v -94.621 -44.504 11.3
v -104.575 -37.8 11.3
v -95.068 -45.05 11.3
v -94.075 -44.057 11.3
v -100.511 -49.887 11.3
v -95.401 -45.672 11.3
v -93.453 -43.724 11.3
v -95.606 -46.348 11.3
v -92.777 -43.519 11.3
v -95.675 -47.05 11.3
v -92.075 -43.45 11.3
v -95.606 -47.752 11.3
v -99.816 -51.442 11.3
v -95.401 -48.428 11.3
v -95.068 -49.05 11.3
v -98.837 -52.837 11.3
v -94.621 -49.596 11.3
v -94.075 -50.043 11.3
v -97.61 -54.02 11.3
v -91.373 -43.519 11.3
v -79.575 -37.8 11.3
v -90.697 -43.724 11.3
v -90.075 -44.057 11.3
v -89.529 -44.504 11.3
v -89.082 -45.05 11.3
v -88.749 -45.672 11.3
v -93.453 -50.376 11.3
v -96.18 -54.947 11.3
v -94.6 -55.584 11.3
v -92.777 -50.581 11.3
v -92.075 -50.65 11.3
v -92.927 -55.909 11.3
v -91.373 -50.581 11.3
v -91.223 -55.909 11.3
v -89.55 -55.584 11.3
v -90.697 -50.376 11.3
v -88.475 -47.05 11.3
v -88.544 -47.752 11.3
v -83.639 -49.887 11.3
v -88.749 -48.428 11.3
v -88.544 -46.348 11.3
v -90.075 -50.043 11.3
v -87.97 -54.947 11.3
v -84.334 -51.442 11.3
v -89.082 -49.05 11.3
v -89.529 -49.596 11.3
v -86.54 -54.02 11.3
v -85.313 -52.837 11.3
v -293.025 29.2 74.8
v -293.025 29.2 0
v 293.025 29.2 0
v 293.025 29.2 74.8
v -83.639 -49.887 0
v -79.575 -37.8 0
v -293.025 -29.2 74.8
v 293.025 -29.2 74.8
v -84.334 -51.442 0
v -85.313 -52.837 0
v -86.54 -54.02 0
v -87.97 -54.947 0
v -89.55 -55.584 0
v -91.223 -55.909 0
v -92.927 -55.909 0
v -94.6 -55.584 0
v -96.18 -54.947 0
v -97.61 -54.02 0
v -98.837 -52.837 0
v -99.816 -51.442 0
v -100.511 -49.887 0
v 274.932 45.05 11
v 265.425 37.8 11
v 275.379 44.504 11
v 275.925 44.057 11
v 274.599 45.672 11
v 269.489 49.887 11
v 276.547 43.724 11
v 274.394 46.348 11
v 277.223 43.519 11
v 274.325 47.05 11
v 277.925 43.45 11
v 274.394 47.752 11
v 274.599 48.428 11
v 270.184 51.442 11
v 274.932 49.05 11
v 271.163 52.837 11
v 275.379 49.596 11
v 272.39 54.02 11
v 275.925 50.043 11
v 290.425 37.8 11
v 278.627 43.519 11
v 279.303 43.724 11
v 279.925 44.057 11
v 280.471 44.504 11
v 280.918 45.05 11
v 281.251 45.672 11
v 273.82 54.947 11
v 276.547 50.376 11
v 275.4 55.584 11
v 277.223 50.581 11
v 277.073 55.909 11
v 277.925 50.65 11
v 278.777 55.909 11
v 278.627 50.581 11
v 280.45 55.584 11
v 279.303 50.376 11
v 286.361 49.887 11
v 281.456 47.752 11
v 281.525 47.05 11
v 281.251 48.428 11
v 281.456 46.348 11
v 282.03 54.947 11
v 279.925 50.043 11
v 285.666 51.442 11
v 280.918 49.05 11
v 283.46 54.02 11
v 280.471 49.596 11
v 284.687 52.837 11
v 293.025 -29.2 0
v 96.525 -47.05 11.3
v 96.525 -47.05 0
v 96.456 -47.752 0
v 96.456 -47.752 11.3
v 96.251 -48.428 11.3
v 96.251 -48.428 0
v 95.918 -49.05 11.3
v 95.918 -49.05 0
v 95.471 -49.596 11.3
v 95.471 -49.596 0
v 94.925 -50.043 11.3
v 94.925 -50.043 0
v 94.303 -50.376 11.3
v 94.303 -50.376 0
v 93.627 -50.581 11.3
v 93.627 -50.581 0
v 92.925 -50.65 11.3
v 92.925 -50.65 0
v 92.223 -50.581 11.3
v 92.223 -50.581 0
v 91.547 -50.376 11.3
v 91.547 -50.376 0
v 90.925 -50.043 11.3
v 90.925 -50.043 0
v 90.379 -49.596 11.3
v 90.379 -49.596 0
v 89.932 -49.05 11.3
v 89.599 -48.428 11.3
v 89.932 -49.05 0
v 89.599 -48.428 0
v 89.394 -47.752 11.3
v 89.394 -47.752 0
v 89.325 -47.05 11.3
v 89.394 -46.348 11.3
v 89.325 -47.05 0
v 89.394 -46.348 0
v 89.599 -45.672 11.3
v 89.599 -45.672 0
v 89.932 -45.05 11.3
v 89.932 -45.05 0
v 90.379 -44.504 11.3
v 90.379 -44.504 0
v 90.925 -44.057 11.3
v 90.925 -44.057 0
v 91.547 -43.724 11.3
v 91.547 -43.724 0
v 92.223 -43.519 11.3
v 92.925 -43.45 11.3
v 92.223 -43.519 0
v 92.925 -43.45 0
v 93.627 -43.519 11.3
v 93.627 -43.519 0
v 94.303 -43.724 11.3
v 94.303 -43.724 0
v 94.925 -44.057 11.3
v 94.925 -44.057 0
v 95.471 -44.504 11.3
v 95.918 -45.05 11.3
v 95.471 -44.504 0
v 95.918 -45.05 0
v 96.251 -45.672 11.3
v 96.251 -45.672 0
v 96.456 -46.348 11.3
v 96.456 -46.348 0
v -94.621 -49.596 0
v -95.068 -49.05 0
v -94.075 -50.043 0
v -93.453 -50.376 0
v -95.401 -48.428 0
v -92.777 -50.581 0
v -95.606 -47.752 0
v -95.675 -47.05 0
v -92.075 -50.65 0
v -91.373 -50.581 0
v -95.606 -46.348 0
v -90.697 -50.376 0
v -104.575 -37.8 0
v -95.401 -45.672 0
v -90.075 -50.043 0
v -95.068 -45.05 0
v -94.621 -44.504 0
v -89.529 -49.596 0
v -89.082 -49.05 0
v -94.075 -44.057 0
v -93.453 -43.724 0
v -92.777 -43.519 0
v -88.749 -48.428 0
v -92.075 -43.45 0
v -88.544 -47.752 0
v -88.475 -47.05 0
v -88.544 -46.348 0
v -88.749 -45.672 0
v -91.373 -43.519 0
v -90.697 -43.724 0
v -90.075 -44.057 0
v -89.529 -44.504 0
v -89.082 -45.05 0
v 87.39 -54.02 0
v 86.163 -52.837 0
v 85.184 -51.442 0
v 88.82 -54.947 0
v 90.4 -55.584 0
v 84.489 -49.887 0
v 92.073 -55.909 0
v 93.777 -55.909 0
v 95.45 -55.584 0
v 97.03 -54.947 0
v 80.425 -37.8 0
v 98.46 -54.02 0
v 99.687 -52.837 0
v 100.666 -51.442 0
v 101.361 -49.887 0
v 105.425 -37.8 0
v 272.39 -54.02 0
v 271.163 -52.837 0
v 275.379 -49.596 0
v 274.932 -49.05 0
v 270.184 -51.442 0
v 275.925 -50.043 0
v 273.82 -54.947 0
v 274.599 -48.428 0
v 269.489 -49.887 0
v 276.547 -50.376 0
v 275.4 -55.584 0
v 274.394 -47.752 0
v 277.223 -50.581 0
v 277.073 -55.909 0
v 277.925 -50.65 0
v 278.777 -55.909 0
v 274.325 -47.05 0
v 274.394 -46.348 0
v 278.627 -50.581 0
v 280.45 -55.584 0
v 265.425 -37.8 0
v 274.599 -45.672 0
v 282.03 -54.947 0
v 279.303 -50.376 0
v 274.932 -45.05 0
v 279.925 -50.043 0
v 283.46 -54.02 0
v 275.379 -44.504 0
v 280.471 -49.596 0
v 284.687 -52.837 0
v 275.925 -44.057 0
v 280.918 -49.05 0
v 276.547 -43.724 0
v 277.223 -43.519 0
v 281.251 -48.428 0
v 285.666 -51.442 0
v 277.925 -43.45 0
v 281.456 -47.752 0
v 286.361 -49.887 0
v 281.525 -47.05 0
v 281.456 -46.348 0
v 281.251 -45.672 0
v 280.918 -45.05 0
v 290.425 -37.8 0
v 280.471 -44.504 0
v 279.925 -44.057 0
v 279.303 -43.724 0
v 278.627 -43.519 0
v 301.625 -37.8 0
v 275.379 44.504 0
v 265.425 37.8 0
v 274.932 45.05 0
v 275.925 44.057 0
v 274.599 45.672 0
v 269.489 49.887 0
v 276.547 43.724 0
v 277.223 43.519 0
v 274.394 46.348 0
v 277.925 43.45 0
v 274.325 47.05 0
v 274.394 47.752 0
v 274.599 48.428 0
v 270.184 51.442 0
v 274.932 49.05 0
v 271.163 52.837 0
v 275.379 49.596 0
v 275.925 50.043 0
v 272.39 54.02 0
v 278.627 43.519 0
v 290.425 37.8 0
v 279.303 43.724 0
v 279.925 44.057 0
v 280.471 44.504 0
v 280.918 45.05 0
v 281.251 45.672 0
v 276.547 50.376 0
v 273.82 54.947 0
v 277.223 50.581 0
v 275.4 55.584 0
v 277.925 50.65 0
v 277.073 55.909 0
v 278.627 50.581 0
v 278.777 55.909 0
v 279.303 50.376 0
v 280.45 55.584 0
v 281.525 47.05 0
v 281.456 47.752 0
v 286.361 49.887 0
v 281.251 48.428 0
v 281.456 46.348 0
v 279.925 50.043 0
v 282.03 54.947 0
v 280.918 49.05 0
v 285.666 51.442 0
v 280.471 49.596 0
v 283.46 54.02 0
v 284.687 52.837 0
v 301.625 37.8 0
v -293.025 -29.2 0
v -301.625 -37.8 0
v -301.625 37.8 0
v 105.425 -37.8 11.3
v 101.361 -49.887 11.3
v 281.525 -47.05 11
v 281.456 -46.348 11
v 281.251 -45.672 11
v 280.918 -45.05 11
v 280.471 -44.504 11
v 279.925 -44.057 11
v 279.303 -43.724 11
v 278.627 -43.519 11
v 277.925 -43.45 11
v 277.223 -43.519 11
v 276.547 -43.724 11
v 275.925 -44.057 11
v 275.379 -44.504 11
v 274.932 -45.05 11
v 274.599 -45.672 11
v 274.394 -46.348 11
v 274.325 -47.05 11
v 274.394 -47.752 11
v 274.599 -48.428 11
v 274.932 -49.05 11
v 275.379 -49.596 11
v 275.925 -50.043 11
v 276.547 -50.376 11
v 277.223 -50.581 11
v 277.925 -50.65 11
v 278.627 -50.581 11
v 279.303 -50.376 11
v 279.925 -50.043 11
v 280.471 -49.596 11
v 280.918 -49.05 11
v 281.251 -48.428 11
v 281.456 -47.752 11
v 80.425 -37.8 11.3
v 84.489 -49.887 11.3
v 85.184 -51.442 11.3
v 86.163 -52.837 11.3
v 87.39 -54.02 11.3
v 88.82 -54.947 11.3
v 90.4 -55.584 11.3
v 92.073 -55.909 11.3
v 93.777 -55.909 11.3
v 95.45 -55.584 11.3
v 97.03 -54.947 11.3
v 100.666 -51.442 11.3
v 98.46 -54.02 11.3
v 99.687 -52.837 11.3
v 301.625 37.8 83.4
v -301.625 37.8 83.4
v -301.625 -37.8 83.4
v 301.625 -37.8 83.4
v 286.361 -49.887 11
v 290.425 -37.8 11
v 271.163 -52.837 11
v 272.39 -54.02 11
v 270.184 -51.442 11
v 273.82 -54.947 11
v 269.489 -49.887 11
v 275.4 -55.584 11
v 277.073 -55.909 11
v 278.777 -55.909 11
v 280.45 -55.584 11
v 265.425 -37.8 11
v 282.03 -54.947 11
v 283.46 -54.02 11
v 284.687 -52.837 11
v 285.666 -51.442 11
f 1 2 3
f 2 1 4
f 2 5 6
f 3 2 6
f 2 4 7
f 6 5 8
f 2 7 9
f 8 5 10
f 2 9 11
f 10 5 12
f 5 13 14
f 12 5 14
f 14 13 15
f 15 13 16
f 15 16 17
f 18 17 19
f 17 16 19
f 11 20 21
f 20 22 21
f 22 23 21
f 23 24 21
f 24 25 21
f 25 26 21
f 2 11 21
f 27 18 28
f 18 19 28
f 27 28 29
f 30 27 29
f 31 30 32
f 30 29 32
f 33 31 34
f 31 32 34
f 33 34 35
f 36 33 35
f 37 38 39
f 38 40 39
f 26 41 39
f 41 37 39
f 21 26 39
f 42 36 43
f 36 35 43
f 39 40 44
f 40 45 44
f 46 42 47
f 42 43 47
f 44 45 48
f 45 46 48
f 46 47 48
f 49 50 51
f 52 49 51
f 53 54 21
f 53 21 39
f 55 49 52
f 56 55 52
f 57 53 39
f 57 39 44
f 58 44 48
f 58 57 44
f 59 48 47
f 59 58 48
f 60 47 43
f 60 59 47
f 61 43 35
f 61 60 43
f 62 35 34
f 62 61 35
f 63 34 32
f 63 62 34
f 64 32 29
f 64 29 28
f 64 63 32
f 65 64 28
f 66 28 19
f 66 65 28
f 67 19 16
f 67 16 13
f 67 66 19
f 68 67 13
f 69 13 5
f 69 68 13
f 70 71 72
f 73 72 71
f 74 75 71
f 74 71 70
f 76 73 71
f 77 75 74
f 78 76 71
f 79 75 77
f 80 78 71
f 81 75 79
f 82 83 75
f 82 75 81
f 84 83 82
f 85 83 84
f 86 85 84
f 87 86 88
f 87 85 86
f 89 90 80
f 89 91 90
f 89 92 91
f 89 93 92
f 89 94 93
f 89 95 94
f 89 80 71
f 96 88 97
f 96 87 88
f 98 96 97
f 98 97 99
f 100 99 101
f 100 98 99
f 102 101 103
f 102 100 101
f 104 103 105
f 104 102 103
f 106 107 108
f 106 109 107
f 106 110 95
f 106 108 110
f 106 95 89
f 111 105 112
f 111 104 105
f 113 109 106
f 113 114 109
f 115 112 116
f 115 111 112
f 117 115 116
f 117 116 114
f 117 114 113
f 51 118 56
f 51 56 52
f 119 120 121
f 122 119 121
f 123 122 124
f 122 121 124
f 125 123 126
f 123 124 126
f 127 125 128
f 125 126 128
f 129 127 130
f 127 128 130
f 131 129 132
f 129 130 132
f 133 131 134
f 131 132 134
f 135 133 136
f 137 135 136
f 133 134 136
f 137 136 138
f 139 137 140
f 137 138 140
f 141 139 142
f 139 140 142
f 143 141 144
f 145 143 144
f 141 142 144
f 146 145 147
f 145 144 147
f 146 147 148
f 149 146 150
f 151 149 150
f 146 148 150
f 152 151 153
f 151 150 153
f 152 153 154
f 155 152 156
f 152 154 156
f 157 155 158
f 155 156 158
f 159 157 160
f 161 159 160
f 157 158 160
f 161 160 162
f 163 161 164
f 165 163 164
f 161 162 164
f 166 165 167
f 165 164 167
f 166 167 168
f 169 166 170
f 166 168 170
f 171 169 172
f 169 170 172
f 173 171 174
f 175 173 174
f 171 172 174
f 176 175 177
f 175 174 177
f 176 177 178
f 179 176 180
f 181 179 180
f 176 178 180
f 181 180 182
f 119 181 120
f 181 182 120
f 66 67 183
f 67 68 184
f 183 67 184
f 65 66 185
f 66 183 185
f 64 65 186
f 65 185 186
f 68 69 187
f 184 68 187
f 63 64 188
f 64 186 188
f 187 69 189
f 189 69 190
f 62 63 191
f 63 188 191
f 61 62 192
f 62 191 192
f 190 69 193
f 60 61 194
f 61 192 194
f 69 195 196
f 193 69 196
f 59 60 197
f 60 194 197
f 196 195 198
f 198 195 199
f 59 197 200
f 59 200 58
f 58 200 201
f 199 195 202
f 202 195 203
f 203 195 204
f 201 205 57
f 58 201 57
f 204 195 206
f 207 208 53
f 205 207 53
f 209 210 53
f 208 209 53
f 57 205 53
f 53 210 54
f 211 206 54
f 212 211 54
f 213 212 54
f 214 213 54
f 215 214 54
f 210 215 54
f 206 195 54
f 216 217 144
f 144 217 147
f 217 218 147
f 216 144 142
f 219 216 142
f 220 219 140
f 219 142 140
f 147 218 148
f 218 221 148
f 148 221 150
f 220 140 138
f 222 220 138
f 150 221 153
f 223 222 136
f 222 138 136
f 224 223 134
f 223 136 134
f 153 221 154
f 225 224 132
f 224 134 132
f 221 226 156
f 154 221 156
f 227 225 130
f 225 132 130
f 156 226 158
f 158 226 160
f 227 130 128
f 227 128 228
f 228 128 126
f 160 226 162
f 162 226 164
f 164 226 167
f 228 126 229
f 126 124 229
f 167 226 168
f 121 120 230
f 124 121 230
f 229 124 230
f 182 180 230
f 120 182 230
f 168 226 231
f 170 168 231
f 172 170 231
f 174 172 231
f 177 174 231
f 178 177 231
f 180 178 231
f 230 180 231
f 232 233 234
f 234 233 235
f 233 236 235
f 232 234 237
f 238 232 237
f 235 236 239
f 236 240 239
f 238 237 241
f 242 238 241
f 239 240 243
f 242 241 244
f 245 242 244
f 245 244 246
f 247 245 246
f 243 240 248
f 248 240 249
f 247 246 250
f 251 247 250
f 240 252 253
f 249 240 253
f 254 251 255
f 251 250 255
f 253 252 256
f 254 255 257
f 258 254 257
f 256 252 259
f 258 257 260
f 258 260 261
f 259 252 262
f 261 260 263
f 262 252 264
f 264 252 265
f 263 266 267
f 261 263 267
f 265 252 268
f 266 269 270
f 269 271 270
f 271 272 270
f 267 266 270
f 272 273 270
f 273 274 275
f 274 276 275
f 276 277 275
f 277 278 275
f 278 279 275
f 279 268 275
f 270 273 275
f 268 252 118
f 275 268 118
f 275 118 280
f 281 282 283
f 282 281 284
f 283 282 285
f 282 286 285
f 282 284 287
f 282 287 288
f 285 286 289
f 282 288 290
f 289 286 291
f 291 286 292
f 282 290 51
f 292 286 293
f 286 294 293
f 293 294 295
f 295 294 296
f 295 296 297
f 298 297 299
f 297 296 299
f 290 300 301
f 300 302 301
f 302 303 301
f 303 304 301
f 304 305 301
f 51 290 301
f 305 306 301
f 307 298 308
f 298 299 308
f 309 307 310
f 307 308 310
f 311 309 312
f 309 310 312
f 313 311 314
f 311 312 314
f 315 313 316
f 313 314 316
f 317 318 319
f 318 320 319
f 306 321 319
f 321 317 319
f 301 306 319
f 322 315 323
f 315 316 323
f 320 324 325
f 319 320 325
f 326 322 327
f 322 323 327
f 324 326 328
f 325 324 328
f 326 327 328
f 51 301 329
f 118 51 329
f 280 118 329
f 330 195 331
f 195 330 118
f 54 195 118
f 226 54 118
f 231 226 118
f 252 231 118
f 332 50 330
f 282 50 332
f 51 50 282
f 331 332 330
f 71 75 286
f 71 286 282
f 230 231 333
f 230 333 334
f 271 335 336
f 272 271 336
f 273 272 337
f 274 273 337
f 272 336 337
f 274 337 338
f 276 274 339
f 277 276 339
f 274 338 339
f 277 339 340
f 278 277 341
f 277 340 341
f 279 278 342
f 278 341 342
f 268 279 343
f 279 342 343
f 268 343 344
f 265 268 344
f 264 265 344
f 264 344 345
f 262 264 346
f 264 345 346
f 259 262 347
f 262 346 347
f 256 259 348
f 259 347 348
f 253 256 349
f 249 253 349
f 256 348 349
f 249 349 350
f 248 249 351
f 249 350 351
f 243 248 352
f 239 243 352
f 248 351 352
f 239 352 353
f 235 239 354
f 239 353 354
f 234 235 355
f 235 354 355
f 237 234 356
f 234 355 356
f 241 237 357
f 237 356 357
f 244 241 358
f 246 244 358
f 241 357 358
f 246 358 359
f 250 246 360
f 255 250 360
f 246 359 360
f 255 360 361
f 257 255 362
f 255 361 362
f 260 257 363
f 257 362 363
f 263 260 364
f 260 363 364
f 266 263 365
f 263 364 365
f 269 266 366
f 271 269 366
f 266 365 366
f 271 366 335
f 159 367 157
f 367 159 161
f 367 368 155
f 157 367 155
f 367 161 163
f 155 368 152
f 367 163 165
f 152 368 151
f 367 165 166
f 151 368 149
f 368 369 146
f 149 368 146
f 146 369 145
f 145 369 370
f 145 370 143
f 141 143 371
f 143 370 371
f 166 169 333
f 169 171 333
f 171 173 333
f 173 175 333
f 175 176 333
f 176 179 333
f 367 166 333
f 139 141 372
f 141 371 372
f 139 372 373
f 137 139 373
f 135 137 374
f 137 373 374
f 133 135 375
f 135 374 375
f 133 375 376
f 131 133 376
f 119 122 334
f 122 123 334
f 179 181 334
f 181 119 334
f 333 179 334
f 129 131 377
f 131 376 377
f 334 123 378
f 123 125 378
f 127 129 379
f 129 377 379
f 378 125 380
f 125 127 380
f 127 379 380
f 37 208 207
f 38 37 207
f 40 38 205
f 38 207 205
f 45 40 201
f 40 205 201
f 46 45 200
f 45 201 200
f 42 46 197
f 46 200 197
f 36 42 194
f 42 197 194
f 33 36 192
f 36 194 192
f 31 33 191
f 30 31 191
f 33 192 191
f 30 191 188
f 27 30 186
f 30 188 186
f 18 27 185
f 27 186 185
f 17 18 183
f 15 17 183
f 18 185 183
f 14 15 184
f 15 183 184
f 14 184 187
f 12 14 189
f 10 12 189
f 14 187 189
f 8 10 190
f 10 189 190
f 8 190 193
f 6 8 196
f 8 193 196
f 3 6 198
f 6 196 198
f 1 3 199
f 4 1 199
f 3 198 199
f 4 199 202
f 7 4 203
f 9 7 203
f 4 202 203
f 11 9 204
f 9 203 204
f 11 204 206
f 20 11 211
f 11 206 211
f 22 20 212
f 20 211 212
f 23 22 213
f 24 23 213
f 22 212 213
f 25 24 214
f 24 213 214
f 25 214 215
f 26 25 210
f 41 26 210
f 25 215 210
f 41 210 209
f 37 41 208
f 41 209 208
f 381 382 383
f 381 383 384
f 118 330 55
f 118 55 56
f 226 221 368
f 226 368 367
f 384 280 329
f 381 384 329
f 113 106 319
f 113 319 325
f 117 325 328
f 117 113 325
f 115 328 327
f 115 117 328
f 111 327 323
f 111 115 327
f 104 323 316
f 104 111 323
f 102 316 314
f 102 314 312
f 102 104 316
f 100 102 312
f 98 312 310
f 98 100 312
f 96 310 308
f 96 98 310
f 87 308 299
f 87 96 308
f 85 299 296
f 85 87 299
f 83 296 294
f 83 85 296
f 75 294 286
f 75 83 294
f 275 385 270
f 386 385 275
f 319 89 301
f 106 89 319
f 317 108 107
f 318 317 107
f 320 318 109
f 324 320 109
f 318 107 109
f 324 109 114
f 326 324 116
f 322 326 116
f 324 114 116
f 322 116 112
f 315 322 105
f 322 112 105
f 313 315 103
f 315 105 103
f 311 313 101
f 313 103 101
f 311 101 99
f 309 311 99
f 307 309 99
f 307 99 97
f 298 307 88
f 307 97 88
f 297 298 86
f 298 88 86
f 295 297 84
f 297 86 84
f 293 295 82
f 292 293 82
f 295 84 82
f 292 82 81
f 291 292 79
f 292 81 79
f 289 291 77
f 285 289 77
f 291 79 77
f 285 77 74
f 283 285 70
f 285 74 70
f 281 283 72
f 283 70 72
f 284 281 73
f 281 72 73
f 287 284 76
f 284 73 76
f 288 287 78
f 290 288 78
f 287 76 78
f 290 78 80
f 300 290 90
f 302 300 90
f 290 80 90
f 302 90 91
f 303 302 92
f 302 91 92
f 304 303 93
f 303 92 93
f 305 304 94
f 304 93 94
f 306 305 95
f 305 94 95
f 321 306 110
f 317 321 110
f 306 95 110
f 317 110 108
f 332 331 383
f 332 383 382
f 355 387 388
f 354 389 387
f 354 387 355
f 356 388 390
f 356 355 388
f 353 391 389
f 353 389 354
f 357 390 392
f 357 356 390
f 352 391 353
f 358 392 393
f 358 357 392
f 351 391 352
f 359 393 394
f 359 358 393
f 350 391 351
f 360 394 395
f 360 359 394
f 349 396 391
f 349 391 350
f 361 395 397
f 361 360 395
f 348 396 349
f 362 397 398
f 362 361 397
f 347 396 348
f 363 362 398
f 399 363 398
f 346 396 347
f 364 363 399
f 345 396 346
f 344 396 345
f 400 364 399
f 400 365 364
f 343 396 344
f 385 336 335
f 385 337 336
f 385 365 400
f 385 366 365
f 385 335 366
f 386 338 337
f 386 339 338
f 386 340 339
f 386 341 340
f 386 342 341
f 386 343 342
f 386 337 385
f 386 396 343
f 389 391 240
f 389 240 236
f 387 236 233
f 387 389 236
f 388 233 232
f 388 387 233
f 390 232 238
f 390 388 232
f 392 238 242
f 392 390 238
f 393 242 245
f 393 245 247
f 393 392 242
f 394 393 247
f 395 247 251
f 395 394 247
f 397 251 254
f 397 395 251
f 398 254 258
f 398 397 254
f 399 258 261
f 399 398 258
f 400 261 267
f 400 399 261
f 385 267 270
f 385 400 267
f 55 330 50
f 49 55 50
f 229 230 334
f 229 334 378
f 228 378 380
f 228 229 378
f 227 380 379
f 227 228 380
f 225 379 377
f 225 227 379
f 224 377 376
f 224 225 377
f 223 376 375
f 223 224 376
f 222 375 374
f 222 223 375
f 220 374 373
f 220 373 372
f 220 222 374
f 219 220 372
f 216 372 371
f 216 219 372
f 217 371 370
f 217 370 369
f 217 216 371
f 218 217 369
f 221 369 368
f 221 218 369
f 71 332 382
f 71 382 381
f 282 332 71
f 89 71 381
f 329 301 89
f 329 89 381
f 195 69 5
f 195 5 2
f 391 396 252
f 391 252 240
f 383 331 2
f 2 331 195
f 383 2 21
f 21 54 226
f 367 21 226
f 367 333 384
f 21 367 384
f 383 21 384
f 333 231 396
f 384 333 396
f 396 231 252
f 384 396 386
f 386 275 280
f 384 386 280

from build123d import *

# Parameters (mm, degrees)
F0_W     = 603.25
F0_H     = 75.6
F1_DEPTH = 83.4
F2_T     = -8.6
F4_START = -72.4
F3_R     = 3.6
F4_DEPTH = 11
F5_R     = 3.6
F6_DEPTH = 11.3


with BuildPart() as f1:
    # F0 (on Top) → F1 (new body)
    with BuildSketch(Plane.XY):
        Rectangle(F0_W, F0_H)
    extrude(amount=F1_DEPTH)

    # F2
    f2_openings = [f1.faces().sort_by_distance(p)[0] for p in [
        (0, 0, 0),
    ]]
    offset(amount=F2_T, openings=f2_openings)

    # F3 (on face) → F4 (join)
    with BuildSketch(Plane.XY.offset(83.4).offset(F4_START)):
        with BuildLine():
            Line((290.425, 37.8), (286.3608661331, 49.8865758556))
            ThreePointArc((286.3608661331, 49.8865758556), (277.925, 55.95), (269.4891338669, 49.8865758556))
            Line((269.4891338669, 49.8865758556), (265.425, 37.8))
            Line((265.425, 37.8), (290.425, 37.8))
        make_face()
        with Locations((277.925, 47.05)):
            Circle(F3_R, mode=Mode.SUBTRACT)
        with BuildLine():
            Line((290.425, -37.8), (265.425, -37.8))
            Line((265.425, -37.8), (269.4891338669, -49.8865758556))
            ThreePointArc((269.4891338669, -49.8865758556), (277.925, -55.95), (286.3608661331, -49.8865758556))
            Line((286.3608661331, -49.8865758556), (290.425, -37.8))
        make_face()
        with Locations((277.925, -47.05)):
            Circle(F3_R, mode=Mode.SUBTRACT)
    extrude(amount=-F4_DEPTH)

    # F5 (on face) → F6 (join)
    with BuildSketch(Plane(origin=(0, 0, 0), x_dir=(1, 0, 0), z_dir=(0, 0, -1))):
        with BuildLine():
            Line((80.425, 37.8), (105.425, 37.8))
            Line((105.425, 37.8), (101.3608661331, 49.8865758556))
            ThreePointArc((101.3608661331, 49.8865758556), (92.925, 55.95), (84.4891338669, 49.8865758556))
            Line((84.4891338669, 49.8865758556), (80.425, 37.8))
        make_face()
        with Locations((92.925, 47.05)):
            Circle(F5_R, mode=Mode.SUBTRACT)
        with BuildLine():
            Line((-104.575, 37.8), (-79.575, 37.8))
            Line((-79.575, 37.8), (-83.6391338669, 49.8865758556))
            ThreePointArc((-83.6391338669, 49.8865758556), (-92.075, 55.95), (-100.5108661331, 49.8865758556))
            Line((-100.5108661331, 49.8865758556), (-104.575, 37.8))
        make_face()
        with Locations((-92.075, 47.05)):
            Circle(F5_R, mode=Mode.SUBTRACT)
    extrude(amount=-F6_DEPTH)


solid = f1.part
